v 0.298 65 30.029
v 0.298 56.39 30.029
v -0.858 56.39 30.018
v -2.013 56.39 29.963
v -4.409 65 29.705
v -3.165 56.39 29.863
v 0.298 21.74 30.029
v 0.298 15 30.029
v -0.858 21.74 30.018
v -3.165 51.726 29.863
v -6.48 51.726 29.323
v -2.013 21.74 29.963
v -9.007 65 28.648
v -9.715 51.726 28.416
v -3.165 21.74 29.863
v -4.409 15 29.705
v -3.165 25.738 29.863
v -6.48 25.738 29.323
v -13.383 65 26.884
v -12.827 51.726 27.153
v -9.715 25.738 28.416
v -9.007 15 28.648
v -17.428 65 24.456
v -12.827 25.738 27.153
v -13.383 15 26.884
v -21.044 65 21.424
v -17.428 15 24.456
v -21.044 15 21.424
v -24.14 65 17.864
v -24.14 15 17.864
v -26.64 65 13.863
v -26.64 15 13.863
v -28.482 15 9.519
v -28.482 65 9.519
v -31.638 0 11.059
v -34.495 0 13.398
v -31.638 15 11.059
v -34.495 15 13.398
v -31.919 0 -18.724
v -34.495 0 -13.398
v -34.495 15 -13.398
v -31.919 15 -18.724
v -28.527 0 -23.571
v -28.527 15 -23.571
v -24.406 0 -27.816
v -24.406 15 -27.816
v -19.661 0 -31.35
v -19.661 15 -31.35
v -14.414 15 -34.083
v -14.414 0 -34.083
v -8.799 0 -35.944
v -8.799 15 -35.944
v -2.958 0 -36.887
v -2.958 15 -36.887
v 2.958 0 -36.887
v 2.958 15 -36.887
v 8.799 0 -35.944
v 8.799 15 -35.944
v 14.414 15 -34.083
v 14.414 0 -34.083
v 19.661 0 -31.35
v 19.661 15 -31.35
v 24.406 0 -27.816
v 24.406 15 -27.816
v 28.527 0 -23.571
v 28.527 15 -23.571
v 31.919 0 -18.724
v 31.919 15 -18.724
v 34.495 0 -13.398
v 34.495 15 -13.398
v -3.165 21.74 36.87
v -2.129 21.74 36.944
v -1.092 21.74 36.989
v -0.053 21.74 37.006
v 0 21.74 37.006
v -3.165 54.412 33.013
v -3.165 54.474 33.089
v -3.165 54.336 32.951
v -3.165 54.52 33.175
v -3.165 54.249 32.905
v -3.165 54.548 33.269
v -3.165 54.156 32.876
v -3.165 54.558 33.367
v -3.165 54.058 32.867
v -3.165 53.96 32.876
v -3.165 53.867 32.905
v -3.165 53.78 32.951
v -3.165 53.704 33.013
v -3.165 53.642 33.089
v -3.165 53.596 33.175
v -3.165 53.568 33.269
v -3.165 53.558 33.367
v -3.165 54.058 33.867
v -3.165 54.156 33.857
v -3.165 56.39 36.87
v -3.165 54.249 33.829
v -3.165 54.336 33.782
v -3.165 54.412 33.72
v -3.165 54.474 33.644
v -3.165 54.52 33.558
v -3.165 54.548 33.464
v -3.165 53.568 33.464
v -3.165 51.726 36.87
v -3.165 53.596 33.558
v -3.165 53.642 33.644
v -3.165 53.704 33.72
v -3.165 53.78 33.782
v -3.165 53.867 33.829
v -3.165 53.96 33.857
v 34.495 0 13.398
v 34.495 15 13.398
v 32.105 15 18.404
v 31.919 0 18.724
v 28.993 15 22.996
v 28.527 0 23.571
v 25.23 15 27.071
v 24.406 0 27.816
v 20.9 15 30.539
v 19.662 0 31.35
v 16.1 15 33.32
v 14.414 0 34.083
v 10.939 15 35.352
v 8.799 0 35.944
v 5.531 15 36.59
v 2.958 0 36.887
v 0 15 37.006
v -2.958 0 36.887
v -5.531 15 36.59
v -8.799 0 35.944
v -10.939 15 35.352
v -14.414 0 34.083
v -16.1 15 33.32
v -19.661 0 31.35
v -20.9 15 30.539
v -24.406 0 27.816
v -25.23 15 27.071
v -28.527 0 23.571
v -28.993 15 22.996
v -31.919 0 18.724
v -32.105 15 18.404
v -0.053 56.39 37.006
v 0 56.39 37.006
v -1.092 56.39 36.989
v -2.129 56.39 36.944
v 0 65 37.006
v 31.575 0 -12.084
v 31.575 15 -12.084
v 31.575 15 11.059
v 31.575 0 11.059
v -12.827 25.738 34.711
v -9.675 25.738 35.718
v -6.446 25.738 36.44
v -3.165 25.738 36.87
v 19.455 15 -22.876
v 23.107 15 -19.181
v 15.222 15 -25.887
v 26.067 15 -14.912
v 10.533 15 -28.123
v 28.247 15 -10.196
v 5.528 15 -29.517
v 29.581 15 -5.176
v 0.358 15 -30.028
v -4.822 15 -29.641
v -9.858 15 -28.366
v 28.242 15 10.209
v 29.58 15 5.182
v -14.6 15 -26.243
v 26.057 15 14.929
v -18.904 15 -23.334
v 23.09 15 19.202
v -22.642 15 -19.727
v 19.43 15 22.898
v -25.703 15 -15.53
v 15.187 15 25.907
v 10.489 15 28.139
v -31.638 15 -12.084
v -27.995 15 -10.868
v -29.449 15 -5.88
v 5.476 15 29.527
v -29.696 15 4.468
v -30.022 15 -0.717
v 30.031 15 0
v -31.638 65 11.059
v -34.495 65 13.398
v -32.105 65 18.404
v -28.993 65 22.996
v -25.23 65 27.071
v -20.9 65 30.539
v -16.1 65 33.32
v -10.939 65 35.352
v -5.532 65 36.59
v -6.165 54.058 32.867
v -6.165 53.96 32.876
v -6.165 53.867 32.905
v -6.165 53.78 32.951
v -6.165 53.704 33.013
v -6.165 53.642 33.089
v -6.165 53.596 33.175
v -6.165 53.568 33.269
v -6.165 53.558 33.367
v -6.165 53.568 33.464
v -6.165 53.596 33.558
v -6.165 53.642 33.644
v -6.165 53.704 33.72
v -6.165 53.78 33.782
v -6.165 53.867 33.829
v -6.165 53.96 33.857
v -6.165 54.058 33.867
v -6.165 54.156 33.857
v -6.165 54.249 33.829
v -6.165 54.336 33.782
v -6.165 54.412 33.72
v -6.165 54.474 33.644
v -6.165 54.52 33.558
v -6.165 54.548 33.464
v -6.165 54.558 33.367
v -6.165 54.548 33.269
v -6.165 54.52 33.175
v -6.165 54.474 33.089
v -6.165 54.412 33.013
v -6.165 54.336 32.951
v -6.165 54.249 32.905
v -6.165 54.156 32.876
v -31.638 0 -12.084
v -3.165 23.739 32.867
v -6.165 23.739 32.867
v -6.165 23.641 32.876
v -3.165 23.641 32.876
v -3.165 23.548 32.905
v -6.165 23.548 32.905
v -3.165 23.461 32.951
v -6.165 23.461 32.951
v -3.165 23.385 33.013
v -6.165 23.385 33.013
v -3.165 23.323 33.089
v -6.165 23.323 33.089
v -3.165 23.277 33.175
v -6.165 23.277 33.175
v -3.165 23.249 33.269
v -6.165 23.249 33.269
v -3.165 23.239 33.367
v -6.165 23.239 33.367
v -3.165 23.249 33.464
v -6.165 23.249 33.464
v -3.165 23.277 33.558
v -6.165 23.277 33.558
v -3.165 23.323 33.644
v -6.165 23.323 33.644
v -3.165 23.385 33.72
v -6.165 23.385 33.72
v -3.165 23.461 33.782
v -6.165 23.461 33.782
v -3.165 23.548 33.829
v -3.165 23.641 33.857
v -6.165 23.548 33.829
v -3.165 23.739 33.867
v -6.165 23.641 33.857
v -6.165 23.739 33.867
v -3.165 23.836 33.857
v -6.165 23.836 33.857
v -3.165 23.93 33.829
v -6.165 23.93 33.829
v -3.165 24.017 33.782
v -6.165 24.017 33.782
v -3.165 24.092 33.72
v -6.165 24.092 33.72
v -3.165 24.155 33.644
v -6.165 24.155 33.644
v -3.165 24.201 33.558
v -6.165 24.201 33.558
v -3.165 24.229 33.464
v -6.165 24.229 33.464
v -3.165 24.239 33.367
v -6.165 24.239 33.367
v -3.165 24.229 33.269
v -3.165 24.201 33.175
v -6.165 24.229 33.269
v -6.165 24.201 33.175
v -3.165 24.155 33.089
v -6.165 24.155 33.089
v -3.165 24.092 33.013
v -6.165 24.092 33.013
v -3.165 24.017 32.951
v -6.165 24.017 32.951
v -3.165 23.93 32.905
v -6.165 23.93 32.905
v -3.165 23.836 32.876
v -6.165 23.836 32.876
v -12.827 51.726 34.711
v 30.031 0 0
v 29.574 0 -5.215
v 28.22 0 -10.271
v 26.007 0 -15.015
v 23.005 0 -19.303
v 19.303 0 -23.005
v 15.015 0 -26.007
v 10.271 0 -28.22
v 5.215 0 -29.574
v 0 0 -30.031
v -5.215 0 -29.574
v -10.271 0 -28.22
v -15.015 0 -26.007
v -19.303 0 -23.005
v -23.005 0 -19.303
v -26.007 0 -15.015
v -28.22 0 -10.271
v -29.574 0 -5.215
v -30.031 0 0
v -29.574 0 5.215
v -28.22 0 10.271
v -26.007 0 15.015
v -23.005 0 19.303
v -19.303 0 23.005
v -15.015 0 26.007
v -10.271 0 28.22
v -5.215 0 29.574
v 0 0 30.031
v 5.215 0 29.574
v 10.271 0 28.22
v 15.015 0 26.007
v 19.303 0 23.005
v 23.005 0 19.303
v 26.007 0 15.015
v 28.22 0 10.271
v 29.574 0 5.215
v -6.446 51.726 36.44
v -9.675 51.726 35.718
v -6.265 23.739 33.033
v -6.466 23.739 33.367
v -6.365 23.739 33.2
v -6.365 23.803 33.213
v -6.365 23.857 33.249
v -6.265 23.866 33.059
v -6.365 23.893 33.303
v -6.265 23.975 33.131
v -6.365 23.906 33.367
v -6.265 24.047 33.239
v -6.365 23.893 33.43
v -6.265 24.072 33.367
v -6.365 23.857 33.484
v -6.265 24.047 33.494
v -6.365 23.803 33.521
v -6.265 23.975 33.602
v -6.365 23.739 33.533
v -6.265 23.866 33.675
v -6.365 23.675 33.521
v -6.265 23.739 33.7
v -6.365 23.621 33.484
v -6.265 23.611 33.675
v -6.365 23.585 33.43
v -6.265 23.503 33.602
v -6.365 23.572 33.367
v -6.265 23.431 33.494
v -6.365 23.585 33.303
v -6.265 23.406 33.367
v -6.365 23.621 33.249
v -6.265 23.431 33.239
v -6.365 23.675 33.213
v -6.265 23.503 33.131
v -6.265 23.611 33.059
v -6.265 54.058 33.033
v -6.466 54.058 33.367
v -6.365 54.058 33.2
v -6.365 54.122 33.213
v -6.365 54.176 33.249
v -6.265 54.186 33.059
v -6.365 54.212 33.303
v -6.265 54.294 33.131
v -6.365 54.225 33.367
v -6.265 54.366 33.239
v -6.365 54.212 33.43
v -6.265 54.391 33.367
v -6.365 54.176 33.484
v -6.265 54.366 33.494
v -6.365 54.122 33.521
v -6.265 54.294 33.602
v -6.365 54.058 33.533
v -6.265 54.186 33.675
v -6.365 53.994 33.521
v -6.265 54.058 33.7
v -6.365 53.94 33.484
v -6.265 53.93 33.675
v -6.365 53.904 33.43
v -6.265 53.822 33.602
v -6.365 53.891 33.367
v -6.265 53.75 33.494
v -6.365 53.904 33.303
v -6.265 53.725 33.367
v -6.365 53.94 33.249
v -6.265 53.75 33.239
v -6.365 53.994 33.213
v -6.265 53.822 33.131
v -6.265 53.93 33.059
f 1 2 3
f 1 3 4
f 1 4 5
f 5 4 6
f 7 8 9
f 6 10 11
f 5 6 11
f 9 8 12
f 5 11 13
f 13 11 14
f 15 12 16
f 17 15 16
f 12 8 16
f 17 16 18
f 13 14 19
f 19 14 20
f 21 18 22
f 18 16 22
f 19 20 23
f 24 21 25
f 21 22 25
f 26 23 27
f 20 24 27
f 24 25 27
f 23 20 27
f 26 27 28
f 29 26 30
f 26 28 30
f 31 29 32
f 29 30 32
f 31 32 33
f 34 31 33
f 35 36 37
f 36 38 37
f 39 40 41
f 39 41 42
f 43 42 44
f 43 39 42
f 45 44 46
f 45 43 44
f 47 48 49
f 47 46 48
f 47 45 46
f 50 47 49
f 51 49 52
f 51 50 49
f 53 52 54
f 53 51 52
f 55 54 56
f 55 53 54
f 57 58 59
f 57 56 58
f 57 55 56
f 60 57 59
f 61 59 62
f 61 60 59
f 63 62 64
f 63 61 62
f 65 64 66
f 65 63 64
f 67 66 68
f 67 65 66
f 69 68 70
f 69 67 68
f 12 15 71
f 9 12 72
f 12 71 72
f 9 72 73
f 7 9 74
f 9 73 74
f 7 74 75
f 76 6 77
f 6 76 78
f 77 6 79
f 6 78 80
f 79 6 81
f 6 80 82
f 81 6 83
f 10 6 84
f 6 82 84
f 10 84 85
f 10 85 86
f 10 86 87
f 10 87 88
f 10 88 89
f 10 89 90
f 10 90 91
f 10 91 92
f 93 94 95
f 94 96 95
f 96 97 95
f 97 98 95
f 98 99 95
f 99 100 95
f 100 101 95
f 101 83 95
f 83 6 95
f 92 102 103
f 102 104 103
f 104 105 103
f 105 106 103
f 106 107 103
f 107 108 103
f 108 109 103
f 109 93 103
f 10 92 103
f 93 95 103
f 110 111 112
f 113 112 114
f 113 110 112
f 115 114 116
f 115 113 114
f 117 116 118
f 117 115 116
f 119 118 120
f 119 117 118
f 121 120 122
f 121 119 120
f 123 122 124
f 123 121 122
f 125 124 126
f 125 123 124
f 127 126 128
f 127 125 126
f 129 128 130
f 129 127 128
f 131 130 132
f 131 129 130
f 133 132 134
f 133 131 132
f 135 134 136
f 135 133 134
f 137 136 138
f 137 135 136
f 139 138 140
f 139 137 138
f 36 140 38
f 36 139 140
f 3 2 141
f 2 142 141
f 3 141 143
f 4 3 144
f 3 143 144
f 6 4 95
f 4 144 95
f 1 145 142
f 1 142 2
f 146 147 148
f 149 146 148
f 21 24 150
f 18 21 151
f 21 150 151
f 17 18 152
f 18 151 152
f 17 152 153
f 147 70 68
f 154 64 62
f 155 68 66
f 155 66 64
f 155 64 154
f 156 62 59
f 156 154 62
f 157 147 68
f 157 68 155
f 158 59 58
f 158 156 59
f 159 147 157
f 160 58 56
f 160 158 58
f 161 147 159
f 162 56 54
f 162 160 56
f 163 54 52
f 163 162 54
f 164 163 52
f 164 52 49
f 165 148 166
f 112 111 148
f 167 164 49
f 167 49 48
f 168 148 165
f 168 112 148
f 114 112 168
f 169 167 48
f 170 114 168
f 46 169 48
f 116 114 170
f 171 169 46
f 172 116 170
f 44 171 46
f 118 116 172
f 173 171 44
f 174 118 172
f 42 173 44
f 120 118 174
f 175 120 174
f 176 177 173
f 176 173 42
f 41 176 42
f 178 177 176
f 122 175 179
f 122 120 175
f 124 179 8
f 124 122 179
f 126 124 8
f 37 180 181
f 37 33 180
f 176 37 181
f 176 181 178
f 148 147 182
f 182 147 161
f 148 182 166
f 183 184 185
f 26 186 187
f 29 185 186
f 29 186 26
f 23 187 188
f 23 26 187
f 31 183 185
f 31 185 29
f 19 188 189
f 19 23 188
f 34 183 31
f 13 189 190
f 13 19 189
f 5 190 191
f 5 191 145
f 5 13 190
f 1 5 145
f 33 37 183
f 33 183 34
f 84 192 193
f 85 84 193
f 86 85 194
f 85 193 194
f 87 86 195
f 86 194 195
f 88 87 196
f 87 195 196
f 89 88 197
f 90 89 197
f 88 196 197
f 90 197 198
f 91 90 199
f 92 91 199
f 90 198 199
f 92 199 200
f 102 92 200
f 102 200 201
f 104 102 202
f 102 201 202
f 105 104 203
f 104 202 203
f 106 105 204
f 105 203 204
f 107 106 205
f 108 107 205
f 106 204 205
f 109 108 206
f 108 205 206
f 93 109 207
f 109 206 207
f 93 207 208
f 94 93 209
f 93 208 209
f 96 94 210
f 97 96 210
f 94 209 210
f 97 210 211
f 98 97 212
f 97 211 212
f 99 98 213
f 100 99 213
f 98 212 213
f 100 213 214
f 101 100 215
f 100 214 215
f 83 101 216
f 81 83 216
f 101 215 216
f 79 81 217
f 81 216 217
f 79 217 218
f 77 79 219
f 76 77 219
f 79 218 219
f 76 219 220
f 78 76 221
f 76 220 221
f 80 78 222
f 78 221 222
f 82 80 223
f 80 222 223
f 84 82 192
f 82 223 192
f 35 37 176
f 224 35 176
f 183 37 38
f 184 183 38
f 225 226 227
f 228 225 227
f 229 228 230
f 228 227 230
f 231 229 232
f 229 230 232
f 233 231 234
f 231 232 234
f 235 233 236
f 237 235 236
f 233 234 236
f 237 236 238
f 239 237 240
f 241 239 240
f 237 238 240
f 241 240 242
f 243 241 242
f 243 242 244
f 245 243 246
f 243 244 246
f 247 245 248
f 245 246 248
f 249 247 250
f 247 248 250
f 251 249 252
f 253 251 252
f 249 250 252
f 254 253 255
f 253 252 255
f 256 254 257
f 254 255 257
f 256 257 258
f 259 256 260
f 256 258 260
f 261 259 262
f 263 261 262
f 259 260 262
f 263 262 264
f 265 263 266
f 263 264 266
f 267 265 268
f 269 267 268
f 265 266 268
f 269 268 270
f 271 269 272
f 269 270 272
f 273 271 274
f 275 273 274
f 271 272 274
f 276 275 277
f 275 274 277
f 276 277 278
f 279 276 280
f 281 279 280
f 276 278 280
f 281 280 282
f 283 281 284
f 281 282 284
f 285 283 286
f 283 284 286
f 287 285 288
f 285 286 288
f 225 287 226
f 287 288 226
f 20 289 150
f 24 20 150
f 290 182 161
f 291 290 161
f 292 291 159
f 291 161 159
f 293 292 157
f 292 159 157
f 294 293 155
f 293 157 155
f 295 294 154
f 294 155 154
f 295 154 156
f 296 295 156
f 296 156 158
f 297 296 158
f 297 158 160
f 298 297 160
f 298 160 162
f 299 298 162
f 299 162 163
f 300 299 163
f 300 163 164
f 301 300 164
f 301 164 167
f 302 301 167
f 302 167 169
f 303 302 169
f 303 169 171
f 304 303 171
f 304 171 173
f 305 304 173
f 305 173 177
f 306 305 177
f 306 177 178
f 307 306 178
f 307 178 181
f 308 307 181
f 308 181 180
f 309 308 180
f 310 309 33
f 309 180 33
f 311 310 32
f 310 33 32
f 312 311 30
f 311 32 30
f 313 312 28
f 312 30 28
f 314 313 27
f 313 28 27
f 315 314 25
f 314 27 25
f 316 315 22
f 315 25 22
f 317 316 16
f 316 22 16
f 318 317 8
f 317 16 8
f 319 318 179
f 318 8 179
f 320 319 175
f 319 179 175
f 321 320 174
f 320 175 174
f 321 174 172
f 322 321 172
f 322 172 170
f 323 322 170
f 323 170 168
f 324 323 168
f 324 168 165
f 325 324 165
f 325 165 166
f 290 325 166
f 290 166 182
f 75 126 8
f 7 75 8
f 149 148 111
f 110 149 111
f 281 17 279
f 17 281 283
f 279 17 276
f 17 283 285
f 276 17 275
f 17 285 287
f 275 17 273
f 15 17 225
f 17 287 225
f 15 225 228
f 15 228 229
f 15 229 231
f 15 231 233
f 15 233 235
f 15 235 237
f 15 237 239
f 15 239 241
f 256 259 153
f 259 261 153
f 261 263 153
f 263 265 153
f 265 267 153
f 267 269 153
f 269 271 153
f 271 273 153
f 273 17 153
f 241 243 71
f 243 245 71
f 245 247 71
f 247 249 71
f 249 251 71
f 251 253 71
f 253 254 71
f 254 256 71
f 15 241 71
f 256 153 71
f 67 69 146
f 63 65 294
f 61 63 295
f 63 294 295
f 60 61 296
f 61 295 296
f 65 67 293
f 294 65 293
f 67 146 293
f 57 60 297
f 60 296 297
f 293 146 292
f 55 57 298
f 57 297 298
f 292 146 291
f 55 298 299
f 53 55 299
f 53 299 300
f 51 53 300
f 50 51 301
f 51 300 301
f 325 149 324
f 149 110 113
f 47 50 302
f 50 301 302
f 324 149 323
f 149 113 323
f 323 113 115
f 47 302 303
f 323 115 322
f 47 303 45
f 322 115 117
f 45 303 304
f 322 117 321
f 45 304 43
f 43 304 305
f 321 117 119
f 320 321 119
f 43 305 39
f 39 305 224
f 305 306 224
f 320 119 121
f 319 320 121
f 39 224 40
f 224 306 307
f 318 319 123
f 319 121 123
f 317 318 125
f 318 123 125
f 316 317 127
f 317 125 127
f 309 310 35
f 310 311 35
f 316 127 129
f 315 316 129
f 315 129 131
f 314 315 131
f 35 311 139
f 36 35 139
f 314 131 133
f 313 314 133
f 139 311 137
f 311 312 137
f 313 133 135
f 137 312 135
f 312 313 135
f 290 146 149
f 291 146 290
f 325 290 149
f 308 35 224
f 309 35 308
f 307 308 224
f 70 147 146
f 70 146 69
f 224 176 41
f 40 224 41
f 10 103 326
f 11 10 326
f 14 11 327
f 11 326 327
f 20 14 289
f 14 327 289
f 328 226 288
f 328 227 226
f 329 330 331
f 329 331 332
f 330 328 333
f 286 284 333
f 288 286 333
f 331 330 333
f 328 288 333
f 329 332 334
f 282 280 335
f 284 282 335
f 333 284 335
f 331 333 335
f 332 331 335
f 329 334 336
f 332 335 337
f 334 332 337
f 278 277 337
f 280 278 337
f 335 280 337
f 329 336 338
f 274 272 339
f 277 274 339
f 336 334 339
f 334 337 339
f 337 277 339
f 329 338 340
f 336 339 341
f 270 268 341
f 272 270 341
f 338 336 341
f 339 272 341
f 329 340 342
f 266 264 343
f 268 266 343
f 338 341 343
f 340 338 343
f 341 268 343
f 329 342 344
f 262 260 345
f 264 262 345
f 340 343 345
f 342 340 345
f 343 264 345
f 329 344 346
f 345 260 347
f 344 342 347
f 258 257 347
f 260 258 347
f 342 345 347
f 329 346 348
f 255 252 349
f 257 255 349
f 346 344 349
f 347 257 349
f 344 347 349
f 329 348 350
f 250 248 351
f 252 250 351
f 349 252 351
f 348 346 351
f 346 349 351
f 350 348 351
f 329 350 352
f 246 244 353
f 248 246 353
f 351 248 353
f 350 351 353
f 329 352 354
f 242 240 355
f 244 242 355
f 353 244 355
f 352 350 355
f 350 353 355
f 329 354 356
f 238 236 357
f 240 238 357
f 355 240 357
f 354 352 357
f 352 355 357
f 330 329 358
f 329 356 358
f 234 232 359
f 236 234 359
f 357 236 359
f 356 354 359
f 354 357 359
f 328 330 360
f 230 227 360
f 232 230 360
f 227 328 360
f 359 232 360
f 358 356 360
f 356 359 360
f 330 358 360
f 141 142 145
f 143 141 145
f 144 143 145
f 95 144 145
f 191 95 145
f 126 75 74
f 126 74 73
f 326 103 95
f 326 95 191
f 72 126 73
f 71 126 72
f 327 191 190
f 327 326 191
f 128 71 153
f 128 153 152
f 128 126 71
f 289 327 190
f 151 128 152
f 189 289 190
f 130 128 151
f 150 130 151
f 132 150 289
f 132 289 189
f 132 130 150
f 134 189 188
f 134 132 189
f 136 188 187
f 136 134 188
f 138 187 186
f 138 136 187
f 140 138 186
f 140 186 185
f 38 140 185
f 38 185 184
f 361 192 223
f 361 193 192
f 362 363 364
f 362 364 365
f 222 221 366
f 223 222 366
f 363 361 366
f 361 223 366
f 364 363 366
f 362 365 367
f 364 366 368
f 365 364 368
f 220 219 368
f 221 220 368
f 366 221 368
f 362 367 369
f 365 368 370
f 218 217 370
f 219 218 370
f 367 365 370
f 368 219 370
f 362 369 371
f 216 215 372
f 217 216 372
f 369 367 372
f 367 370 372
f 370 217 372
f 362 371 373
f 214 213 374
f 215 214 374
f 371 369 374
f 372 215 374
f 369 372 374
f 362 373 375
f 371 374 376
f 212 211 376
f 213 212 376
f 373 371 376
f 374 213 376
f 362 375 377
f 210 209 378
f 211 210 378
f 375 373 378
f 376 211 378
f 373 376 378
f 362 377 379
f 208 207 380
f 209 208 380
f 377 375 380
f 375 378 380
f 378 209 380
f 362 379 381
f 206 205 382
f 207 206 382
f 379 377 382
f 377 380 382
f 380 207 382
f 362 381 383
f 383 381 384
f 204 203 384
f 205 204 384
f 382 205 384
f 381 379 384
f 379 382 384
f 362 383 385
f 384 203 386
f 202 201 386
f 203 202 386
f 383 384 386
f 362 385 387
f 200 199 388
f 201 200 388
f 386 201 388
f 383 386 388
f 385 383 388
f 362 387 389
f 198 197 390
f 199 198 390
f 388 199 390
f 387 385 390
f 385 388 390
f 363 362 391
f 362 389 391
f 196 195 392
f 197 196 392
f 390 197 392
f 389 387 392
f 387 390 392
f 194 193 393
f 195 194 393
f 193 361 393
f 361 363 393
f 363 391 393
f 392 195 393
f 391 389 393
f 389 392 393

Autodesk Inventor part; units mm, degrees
ref_plane "YZ Plane" through (0, 0, 0) normal (1, 0, 0) x (0, 1, 0)
ref_plane "XZ Plane" through (0, 0, 0) normal (0, 1, 0) x (-1, 0, 0)
sketch "Sketch1" plane through (0, 0, 0) normal (0, 1, 0) x (-1, 0, 0)
  circle A0 centre (0, 0) radius 37.0055
  circle A1 centre (0, 0) radius 29.8875
extrude "Extrusion1" add sketch "Sketch1" along normal blind 15 contours A0 | A1
sketch "Sketch2" plane through (0, 15, 0) normal (0, 1, 0) x (1, 0, 0)
  circle A0 centre (0, 0) radius 37.0055 projected
  circle A1 centre (0, 0) radius 30.0306
extrude "Extrusion2" cut sketch "Sketch2" against normal blind 15 contours A1
sketch "Sketch3" plane through (0, 15, 0) normal (0, 1, 0) x (1, 0, 0)
  circle A0 centre (0, 0) radius 37.0055 projected
  line L0 (-34.4949, -13.3982) -> (-31.6379, -11.0586)
  line L1 (-31.6379, -11.0586) -> (-31.6379, 12.0839)
  line L2 (-31.6379, 12.0839) -> (-34.4949, 13.3982)
extrude "Extrusion3" cut sketch "Sketch3" against normal blind 15 contours L2 L1 L0 A0 picked at (-33.4271, 0.3418)
sketch "Sketch4" plane through (0, 15, 0) normal (0, 1, 0) x (1, 0, 0)
  arc A0 (-34.4949, -13.3982) -> (-34.4949, 13.3982) centre (0, 0) ccw projected
  line L0 (-31.6379, -11.0586) -> (-31.6379, 12.0839) projected
  line L1 (31.575, 12.0839) -> (31.575, -11.0586)
  line L2 (31.575, -11.0586) -> (34.4949, -13.3982)
  line L3 (31.575, 12.0839) -> (34.4949, 13.3982)
extrude "Extrusion4" cut sketch "Sketch4" against normal blind 15
sketch "Sketch5" plane through (0, 15, 0) normal (0, 1, 0) x (1, 0, 0)
  circle A0 centre (0, 0) radius 30.0306 projected
  line L0 (-31.6379, -11.0586) -> (-34.4949, -13.3982) projected
  arc A1 (-34.4949, -13.3982) -> (34.4949, -13.3982) centre (0, 0) ccw projected
  line L1 (-31.6379, -11.0586) -> (-31.6379, 12.0839) projected
  circle A2 centre (0, 0) radius 30.0306 projected
  line L2 (-31.6379, -11.0586) -> (-28.482, -9.519)
  line L3 (0, -37.0055) -> (0.2981, -30.0291)
extrude "Extrusion5" add sketch "Sketch5" along normal blind 50 contours A0 L3 A1 L0 L2
ref_plane "Work Plane1" through (0, 15, 37.0055) normal (0, 0, 1) x (1, 0, 0)
sketch "Sketch6" plane through (0, 15, 37.0055) normal (0, 0, 1) x (1, 0, 0)
  line L0 (0.2981, 0) -> (0.2981, 50) projected
  line L1 (0.2981, 41.3903) -> (-3.1652, 41.3903)
  line L2 (-3.1652, 41.3903) -> (-3.1652, 36.7258)
  line L3 (-3.1652, 36.7258) -> (-12.8273, 36.7258)
  line L4 (-12.8273, 36.7258) -> (-12.8273, 10.738)
  line L5 (-12.8273, 10.738) -> (-3.1652, 10.738)
  line L6 (-3.1652, 10.738) -> (-3.1652, 6.7398)
  line L7 (-3.1652, 6.7398) -> (0.2981, 6.7398)
  point P0 (0, -15)
extrude "Extrusion6" cut sketch "Sketch6" against normal blind 10
hole "Hole1" at (-3.1652, 23.7389, 33.3666) direction (-1, 0, 0) diameter 1 depth 3 tip angle 118
hole "Hole2" at (-3.1652, 54.058, 33.3666) direction (-1, 0, 0) diameter 1 depth 3 tip angle 118
properties part number "X-axis-gimbal-part"
